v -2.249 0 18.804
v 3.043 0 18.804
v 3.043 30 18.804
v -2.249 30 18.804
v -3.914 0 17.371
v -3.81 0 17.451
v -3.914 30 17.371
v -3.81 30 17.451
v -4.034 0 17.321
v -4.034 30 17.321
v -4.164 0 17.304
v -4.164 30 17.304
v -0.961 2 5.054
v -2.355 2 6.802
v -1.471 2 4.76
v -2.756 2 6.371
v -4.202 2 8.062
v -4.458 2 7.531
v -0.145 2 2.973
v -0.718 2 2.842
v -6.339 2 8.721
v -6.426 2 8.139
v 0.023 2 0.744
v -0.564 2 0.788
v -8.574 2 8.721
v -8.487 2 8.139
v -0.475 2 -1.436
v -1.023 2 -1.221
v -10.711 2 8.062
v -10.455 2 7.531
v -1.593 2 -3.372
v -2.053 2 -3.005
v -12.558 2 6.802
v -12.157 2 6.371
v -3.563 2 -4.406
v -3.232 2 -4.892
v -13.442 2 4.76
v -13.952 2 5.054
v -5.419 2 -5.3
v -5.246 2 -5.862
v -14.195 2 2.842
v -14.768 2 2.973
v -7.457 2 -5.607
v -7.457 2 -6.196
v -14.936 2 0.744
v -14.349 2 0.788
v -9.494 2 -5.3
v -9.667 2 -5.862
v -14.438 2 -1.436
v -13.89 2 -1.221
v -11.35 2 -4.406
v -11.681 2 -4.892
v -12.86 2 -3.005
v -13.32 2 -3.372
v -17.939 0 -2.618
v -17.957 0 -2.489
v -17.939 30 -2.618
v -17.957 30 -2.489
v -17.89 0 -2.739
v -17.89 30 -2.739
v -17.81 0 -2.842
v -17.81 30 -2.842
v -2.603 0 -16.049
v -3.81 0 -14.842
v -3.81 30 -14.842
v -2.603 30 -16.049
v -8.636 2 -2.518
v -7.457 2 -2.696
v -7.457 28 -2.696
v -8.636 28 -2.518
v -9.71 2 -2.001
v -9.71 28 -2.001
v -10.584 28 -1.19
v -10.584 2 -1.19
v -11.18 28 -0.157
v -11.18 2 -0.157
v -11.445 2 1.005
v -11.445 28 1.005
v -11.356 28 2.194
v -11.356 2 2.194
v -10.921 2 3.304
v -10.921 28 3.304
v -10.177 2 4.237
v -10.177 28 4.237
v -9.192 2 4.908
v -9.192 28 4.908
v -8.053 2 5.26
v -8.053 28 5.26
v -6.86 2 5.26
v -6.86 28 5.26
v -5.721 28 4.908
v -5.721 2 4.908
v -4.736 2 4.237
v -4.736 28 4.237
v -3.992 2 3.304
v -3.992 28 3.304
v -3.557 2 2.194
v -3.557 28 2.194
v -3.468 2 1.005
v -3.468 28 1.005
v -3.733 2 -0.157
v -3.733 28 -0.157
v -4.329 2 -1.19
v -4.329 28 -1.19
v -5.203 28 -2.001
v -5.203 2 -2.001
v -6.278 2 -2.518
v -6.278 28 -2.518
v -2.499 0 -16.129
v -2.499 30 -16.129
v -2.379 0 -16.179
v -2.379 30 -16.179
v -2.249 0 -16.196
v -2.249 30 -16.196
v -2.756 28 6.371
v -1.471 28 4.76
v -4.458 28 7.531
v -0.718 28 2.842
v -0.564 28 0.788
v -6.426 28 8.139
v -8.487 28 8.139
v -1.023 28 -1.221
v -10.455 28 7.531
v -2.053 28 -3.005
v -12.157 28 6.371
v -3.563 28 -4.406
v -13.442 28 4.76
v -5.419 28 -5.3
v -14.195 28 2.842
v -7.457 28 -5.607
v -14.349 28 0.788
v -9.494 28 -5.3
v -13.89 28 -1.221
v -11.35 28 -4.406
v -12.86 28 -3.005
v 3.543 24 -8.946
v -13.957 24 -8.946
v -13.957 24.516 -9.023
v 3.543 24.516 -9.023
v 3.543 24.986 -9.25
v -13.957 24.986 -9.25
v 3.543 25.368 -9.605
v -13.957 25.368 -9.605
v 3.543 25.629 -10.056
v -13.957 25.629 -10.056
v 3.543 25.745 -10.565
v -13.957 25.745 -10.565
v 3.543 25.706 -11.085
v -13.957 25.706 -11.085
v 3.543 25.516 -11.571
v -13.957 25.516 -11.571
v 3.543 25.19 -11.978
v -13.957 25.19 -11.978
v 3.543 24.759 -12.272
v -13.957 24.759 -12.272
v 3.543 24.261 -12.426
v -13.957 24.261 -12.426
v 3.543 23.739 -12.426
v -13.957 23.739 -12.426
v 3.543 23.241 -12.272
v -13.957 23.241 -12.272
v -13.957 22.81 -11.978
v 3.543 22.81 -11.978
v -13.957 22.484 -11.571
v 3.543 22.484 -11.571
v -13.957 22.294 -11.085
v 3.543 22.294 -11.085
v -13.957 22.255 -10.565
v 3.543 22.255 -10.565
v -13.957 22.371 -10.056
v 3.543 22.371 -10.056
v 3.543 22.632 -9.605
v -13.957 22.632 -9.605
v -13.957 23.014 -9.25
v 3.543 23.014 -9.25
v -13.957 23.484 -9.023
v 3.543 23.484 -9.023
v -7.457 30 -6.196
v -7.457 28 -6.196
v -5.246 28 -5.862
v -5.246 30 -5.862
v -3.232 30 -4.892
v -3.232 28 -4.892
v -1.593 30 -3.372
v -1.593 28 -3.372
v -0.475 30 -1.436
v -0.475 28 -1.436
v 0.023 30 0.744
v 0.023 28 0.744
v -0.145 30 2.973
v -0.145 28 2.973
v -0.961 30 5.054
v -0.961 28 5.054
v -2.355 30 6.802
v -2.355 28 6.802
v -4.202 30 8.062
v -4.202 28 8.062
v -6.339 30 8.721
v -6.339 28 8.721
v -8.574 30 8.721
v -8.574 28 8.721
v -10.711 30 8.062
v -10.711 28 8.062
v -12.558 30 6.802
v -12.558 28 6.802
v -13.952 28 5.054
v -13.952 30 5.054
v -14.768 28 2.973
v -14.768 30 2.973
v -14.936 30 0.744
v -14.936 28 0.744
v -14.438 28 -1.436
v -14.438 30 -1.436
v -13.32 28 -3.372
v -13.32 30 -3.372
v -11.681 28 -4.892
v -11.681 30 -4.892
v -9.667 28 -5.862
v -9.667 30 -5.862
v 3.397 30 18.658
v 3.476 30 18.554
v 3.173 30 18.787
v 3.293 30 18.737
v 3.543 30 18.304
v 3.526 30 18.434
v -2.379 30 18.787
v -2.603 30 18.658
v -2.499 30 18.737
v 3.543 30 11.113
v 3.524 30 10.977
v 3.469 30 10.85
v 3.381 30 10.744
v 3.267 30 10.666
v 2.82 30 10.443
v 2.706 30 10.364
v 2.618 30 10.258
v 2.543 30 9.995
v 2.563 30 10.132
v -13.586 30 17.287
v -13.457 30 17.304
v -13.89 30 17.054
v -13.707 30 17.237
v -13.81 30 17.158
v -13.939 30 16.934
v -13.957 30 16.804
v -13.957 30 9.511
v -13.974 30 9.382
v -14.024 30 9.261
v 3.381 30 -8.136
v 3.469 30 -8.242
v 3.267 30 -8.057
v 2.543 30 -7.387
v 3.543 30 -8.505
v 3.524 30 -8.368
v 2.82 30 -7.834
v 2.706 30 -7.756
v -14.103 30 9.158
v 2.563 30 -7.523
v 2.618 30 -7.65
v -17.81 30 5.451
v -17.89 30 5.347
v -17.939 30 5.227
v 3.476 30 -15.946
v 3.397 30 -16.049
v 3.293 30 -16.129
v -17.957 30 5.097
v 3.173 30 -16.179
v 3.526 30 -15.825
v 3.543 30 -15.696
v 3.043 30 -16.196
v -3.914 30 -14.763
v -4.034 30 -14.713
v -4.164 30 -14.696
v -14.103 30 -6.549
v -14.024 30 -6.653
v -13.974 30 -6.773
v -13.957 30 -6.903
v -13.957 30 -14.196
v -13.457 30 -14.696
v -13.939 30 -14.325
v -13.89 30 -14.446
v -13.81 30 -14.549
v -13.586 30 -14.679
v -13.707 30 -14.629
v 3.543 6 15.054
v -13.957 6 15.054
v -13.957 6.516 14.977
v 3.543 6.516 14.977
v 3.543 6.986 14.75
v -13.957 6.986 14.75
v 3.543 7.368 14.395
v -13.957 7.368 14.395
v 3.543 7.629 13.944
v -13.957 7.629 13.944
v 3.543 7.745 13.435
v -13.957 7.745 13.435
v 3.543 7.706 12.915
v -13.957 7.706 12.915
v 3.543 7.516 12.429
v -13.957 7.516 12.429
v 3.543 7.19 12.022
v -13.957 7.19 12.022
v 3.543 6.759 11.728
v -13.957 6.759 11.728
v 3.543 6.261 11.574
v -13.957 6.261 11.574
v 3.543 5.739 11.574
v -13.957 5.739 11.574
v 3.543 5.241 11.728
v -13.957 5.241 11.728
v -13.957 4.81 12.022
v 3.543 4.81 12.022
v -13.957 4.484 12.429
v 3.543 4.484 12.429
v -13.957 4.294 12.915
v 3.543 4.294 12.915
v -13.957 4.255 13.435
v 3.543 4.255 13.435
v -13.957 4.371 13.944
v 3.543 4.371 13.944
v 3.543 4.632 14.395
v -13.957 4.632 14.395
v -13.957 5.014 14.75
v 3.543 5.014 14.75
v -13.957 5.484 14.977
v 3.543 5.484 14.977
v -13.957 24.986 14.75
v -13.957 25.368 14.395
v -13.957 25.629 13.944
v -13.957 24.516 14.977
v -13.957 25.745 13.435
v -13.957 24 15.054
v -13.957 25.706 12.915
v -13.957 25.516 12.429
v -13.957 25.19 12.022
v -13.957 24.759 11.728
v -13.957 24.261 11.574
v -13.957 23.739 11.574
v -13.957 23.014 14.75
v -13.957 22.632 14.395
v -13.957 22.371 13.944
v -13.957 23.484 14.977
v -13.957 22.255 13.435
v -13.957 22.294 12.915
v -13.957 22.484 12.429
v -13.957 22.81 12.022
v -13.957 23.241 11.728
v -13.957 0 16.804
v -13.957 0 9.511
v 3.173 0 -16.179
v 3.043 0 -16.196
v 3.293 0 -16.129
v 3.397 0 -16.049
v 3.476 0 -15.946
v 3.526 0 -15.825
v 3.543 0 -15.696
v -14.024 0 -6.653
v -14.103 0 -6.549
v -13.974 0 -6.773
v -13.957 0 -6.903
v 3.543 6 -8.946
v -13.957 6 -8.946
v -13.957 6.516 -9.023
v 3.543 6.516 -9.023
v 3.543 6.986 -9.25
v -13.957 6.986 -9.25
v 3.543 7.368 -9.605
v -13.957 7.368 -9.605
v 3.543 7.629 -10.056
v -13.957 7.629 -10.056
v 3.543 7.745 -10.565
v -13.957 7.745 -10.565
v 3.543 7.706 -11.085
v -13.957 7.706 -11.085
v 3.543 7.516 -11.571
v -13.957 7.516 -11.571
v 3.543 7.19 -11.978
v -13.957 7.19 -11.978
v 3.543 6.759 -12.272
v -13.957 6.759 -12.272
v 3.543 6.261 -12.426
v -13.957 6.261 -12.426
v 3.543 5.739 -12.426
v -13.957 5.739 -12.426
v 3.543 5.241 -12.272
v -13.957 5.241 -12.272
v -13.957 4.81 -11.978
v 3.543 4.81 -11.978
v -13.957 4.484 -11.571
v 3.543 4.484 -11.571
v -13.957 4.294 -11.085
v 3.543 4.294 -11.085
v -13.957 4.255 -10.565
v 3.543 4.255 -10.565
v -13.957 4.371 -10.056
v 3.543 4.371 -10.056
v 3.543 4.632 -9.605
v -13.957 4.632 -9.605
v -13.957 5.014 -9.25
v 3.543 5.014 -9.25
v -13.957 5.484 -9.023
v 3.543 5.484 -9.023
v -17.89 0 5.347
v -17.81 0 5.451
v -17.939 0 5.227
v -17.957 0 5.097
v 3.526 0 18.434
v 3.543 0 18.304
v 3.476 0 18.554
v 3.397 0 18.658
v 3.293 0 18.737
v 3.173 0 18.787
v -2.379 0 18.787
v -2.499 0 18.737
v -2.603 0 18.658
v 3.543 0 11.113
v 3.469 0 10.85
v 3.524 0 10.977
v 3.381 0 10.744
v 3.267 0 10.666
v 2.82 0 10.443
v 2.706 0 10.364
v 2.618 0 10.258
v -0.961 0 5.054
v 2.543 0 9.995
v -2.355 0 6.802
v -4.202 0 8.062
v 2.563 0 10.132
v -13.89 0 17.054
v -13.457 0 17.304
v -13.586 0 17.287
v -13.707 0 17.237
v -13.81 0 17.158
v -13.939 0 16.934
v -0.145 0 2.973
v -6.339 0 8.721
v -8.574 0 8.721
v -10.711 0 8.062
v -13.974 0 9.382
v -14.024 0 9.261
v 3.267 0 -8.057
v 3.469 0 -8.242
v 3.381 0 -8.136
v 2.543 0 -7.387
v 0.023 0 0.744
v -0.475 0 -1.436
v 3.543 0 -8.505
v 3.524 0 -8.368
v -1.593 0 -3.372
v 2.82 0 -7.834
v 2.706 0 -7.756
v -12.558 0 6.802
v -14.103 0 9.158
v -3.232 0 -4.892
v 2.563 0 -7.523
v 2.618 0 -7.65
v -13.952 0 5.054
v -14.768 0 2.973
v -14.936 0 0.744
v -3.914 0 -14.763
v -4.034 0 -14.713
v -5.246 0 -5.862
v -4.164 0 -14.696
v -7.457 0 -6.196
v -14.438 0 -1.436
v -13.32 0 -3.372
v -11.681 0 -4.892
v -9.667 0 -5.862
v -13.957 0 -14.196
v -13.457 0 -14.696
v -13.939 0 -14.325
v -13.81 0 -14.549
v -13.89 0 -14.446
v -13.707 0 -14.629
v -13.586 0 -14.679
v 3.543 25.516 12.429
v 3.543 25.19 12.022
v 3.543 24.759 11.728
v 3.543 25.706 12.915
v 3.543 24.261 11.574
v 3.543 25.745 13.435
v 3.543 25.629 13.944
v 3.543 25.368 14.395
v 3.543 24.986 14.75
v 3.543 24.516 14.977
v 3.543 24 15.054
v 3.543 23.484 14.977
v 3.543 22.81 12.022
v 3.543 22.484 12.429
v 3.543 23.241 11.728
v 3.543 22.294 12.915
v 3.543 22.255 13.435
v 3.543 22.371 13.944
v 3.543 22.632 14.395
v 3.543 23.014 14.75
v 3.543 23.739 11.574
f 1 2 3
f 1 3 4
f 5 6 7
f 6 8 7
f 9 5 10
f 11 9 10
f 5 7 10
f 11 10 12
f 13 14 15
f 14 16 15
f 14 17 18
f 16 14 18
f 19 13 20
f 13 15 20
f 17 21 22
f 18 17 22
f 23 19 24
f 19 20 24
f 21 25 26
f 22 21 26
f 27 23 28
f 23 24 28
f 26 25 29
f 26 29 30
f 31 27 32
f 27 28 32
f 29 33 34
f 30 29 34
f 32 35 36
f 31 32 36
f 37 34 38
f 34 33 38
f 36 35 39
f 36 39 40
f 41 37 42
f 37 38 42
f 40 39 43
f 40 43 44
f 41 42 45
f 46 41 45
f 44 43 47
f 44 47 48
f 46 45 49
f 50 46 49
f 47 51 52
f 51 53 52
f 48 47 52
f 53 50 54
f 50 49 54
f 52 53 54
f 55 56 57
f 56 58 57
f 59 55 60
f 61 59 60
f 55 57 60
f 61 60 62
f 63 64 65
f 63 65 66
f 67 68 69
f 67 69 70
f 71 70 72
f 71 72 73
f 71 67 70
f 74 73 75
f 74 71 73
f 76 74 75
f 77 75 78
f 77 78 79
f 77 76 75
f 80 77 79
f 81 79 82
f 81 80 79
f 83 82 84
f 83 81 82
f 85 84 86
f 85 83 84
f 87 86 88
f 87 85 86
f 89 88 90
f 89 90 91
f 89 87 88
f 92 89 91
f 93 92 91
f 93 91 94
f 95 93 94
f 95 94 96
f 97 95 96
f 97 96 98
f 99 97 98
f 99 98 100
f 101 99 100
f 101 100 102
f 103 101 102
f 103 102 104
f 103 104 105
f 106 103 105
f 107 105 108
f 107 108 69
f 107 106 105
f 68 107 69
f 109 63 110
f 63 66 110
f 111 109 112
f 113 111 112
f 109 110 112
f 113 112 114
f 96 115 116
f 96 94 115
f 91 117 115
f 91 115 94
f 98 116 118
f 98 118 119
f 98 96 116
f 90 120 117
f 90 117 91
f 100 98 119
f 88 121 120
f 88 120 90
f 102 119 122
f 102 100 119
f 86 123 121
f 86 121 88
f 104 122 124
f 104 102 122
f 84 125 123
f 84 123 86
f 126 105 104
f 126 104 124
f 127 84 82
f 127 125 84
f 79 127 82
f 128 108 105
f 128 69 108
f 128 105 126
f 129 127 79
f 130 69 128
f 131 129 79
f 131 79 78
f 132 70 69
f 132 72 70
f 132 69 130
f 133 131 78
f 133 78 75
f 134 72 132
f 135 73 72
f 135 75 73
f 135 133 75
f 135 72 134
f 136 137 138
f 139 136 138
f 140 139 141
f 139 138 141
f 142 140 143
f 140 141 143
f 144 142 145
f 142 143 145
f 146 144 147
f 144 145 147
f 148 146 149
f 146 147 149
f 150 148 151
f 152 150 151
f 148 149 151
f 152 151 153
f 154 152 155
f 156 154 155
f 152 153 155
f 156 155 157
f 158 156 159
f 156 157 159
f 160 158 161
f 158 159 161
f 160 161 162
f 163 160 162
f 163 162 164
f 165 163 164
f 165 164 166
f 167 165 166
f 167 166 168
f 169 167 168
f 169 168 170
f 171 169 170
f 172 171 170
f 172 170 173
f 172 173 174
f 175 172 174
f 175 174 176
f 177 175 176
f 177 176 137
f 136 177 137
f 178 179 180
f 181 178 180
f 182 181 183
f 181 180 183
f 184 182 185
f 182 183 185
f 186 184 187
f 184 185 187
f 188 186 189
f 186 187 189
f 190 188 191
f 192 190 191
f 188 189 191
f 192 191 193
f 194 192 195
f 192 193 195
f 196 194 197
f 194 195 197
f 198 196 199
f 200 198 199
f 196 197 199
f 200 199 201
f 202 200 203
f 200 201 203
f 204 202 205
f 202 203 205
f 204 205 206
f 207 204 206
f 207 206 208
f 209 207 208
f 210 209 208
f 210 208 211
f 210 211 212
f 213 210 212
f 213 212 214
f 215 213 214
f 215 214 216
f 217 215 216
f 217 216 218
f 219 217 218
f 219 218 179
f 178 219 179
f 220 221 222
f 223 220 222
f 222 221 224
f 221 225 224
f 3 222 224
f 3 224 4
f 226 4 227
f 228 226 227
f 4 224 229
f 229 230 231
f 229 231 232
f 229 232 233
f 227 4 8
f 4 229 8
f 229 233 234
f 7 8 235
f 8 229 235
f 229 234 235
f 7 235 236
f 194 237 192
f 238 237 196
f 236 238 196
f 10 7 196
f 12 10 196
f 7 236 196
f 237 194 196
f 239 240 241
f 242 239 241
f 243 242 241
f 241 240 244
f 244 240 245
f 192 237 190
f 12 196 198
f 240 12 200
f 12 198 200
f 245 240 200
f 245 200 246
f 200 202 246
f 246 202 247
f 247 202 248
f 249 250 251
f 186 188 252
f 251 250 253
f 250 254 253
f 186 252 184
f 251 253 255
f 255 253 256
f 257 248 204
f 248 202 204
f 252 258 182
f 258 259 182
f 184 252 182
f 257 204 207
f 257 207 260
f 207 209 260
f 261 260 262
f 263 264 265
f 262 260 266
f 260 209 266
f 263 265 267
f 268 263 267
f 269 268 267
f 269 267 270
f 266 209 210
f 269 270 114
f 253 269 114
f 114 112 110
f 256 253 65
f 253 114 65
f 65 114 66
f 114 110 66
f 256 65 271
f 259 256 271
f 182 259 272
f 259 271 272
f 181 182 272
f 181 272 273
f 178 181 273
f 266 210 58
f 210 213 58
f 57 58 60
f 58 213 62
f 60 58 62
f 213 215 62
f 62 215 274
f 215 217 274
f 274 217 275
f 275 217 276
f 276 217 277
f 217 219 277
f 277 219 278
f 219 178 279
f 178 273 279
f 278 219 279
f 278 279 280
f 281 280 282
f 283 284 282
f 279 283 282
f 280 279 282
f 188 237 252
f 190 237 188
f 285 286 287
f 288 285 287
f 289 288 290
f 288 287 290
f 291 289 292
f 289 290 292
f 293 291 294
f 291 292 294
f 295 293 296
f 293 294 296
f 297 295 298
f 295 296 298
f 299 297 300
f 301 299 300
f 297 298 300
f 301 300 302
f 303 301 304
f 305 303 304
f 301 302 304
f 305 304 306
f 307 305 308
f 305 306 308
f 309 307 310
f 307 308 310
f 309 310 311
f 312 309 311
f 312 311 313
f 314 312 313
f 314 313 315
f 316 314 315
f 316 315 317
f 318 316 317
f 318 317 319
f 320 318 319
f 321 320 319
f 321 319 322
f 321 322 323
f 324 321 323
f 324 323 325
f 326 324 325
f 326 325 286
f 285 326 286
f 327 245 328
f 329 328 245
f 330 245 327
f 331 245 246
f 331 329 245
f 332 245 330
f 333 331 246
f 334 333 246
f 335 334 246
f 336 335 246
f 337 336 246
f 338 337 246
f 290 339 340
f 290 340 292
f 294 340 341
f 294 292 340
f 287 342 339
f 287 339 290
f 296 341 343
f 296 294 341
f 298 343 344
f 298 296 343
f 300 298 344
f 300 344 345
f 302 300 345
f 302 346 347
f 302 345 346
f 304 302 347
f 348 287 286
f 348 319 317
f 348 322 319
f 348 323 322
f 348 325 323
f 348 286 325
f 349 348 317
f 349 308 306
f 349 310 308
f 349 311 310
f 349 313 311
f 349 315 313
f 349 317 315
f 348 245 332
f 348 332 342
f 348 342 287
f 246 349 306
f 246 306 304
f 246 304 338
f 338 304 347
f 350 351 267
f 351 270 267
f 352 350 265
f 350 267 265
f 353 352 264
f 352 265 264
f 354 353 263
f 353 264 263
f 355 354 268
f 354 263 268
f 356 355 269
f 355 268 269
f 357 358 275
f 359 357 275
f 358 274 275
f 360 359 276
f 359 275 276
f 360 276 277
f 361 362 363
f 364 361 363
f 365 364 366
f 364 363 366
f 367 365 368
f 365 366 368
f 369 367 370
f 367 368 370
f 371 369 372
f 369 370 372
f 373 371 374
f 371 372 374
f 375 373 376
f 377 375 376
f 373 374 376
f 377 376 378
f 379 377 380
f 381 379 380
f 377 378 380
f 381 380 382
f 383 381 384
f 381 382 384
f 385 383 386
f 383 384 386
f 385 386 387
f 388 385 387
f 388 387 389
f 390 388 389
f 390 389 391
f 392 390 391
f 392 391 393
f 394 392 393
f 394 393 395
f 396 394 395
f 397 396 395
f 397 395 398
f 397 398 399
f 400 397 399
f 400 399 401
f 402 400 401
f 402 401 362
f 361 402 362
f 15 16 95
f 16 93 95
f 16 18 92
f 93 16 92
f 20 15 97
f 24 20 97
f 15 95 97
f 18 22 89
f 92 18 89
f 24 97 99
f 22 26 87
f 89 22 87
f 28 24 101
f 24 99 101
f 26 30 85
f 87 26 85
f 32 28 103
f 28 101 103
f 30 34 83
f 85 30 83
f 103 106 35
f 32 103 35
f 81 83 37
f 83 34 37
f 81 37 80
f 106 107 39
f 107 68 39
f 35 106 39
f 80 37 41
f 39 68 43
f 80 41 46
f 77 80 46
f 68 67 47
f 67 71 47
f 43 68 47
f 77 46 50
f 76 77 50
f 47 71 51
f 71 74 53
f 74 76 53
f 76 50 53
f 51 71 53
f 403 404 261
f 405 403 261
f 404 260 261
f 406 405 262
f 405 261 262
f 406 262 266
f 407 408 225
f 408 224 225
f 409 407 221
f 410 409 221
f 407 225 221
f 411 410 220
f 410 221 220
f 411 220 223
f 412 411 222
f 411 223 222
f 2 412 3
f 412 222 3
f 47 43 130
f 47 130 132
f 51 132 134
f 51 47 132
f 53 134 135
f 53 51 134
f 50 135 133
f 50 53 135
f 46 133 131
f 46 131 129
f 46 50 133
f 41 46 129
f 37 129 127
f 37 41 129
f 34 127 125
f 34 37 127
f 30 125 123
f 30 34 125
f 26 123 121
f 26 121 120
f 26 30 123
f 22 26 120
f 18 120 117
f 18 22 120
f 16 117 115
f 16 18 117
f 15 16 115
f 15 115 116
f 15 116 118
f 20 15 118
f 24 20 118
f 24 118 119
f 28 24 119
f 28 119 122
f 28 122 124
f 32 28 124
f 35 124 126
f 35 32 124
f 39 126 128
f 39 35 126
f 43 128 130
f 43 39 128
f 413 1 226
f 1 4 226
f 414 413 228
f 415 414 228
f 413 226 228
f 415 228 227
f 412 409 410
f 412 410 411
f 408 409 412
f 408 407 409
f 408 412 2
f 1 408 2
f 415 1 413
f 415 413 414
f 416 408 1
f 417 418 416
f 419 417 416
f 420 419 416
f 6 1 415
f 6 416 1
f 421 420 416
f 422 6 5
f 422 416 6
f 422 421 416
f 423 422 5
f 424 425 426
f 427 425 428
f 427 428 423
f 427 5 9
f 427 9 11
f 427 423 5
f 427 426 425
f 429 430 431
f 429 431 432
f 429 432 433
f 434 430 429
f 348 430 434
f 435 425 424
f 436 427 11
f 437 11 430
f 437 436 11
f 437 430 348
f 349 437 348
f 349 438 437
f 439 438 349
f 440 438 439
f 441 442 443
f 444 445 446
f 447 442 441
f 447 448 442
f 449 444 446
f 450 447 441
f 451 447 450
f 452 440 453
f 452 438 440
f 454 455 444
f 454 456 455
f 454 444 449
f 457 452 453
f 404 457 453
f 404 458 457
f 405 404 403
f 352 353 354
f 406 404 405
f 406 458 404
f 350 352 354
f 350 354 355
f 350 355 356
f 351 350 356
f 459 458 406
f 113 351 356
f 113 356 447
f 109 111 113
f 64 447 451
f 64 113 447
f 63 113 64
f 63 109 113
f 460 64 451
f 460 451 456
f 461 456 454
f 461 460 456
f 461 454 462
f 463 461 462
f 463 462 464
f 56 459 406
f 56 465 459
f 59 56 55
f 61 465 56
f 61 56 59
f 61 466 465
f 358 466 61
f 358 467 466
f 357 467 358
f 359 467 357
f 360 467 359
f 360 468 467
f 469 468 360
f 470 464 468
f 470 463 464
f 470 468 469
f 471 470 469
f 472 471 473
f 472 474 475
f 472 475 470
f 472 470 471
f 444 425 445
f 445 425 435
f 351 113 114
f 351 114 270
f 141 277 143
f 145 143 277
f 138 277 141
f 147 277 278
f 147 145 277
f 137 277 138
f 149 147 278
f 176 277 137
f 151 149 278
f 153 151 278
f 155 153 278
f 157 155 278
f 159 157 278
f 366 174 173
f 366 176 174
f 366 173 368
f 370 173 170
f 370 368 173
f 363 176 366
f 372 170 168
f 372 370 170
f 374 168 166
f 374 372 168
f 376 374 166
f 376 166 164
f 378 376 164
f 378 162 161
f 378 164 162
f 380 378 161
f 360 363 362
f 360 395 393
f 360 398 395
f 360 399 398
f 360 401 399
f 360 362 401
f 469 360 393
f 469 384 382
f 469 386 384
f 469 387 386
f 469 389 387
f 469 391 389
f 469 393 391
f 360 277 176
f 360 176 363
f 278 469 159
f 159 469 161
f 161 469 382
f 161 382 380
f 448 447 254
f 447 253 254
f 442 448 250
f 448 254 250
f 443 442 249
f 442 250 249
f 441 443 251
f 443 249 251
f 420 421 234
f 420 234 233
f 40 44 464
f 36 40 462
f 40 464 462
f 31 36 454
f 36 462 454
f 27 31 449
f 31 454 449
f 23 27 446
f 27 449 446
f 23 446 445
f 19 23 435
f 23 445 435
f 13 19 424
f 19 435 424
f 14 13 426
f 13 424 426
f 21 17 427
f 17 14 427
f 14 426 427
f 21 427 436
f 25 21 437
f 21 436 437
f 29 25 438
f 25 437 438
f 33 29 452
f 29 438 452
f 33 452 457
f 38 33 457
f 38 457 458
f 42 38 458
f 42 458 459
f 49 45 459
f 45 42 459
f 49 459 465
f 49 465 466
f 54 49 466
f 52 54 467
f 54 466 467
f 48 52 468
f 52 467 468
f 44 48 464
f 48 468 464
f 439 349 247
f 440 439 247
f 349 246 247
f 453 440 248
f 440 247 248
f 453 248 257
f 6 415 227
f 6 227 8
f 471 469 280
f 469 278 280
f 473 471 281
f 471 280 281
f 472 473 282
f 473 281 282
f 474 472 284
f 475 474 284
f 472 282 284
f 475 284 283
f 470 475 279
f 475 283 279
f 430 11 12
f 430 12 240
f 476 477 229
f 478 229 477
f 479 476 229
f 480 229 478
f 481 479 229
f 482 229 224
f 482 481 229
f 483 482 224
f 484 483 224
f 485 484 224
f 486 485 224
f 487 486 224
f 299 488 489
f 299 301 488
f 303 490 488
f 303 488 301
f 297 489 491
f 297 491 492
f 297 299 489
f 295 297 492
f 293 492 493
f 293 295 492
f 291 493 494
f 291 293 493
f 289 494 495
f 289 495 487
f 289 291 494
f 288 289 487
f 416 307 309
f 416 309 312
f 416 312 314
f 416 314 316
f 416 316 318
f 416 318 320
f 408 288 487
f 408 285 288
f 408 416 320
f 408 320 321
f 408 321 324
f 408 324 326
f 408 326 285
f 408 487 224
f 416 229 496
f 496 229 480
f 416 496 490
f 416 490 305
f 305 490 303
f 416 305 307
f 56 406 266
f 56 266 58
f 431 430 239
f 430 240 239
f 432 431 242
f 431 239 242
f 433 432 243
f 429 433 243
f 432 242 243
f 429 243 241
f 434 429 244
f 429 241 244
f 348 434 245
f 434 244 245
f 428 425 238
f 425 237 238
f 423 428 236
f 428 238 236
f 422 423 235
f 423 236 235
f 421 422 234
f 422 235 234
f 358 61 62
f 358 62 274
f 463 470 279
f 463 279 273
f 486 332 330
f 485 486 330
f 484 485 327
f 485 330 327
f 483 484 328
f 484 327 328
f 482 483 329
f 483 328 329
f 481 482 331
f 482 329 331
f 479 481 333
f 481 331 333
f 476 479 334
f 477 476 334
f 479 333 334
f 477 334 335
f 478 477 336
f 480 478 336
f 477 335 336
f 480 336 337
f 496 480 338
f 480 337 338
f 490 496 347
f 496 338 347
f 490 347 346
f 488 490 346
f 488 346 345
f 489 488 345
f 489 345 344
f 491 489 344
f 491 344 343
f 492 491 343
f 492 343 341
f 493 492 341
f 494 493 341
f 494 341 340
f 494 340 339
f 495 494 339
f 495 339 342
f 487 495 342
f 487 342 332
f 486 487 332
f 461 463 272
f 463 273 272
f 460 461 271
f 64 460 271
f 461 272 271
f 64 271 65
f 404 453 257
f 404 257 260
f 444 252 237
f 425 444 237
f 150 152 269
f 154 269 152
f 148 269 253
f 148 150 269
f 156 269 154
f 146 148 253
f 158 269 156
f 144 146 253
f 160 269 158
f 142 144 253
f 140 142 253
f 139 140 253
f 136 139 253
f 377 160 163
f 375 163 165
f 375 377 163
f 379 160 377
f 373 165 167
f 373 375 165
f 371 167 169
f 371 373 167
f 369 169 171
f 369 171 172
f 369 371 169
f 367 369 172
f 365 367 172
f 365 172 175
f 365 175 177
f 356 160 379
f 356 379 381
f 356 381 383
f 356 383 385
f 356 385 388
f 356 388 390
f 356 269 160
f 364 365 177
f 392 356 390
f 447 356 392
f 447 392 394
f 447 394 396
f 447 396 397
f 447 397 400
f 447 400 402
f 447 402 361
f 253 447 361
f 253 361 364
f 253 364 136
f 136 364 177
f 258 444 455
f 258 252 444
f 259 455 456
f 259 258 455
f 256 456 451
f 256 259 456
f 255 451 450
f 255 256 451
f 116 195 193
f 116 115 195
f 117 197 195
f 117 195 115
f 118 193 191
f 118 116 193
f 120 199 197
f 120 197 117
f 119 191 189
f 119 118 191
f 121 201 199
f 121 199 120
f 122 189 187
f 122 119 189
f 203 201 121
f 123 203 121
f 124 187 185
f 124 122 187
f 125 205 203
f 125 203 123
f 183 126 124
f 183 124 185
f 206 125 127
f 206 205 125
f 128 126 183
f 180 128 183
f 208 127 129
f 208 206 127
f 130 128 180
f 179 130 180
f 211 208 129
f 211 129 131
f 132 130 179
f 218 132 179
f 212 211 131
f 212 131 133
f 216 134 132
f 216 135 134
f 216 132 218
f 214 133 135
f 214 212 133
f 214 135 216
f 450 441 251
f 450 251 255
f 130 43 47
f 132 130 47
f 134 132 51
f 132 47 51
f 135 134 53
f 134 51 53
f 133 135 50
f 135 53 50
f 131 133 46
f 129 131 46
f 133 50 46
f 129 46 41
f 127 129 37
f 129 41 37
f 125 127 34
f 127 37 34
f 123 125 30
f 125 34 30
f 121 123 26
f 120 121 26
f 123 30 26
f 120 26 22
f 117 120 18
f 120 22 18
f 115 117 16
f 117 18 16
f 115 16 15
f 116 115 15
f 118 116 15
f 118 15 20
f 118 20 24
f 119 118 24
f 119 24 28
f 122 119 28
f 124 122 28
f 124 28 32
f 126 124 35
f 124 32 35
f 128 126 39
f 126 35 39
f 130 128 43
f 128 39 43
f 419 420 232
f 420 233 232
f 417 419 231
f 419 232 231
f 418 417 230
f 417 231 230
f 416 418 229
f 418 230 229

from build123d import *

# Parameters (mm, degrees)
BOSS_EXTRUDE1_DEPTH = 30
FILLET1_R           = 0.5
SKETCH2_R           = 7.5
CUT_EXTRUDE1_DEPTH  = 30
SKETCH4_R           = 7.5
SKETCH4_R_2         = 6.911436733
BOSS_EXTRUDE2_DEPTH = 26
SKETCH5_R           = 6.911436733
SKETCH5_R_2         = 4
BOSS_EXTRUDE3_DEPTH = 26
SKETCH6_R           = 1.75
CUT_EXTRUDE2_DEPTH  = 26


with BuildPart() as part:
    # Sketch1 → Boss-Extrude1 (new body)
    with BuildSketch(Plane(origin=(0, 0, 0), x_dir=(1, 0, 0), z_dir=(0, 1, 0))):
        Polygon((2.543478261, 7.695652174), (2.543478261, -10.304347826), (3.543478261, -10.804347826), (3.543478261, -18.804347826), (-2.456521739, -18.804347826), (-3.956521739, -17.304347826), (-13.956521739, -17.304347826), (-13.956521739, -9.304347826), (-17.956521739, -5.304347826), (-17.956521739, 2.695652174), (-13.956521739, 6.695652174), (-13.956521739, 14.695652174), (-3.956521739, 14.695652174), (-2.456521739, 16.195652174), (3.543478261, 16.195652174), (3.543478261, 8.195652174), align=None)
    extrude(amount=BOSS_EXTRUDE1_DEPTH)

    # Fillet1
    fillet1_edges = [part.edges().sort_by_distance(p)[0] for p in [
        (2.543478261, 15, 10.304347826),
        (3.543478261, 15, 10.804347826),
        (3.543478261, 15, 18.804347826),
        (-2.456521739, 15, 18.804347826),
        (-3.956521739, 15, 17.304347826),
        (-13.956521739, 15, 17.304347826),
        (-13.956521739, 15, 9.304347826),
        (-17.956521739, 15, 5.304347826),
        (-17.956521739, 15, -2.695652174),
        (-13.956521739, 15, -6.695652174),
        (-13.956521739, 15, -14.695652174),
        (-3.956521739, 15, -14.695652174),
        (-2.456521739, 15, -16.195652174),
        (3.543478261, 15, -16.195652174),
        (3.543478261, 15, -8.195652174),
        (2.543478261, 15, -7.695652174),
    ]]
    fillet(fillet1_edges, radius=FILLET1_R)

    # Sketch2 → Cut-Extrude1 (cut)
    with BuildSketch(Plane.XZ):
        with Locations(Location((-7.456521739, 1.304347826, 0), (0, 0, 270))):
            Circle(SKETCH2_R)
    extrude(amount=-CUT_EXTRUDE1_DEPTH, mode=Mode.SUBTRACT)

    # Sketch4 → Boss-Extrude2 (add)
    with BuildSketch(Plane(origin=(0, 2, 0), x_dir=(1, 0, 0), z_dir=(0, 1, 0))):
        with Locations(Location((-7.456521739, -1.304347826, 0), (0, 0, 90))):
            Circle(SKETCH4_R)
        with Locations(Location((-7.456521739, -1.304347826, 0), (0, 0, 90))):
            Circle(SKETCH4_R_2, mode=Mode.SUBTRACT)
    extrude(amount=BOSS_EXTRUDE2_DEPTH)

    # Sketch6 → Cut-Extrude2 (cut)
    with BuildSketch(Plane.ZY.offset(13.956521739)):
        with Locations((13.304347826, 24)):
            Circle(SKETCH6_R)
        with Locations((13.304347826, 6)):
            Circle(SKETCH6_R)
        with Locations((-10.695652174, 6)):
            Circle(SKETCH6_R)
        with Locations((-10.695652174, 24)):
            Circle(SKETCH6_R)
    extrude(amount=-CUT_EXTRUDE2_DEPTH, mode=Mode.SUBTRACT)


with BuildPart() as body_2:
    # Sketch5 → Boss-Extrude3 (new body)
    with BuildSketch(Plane(origin=(0, 2, 0), x_dir=(1, 0, 0), z_dir=(0, 1, 0))):
        with Locations(Location((-7.456521739, -1.304347826, 0), (0, 0, 90))):
            Circle(SKETCH5_R)
        with Locations(Location((-7.456521739, -1.304347826, 0), (0, 0, 90))):
            Circle(SKETCH5_R_2, mode=Mode.SUBTRACT)
    extrude(amount=BOSS_EXTRUDE3_DEPTH)


solid = Compound([part.part, body_2.part])
